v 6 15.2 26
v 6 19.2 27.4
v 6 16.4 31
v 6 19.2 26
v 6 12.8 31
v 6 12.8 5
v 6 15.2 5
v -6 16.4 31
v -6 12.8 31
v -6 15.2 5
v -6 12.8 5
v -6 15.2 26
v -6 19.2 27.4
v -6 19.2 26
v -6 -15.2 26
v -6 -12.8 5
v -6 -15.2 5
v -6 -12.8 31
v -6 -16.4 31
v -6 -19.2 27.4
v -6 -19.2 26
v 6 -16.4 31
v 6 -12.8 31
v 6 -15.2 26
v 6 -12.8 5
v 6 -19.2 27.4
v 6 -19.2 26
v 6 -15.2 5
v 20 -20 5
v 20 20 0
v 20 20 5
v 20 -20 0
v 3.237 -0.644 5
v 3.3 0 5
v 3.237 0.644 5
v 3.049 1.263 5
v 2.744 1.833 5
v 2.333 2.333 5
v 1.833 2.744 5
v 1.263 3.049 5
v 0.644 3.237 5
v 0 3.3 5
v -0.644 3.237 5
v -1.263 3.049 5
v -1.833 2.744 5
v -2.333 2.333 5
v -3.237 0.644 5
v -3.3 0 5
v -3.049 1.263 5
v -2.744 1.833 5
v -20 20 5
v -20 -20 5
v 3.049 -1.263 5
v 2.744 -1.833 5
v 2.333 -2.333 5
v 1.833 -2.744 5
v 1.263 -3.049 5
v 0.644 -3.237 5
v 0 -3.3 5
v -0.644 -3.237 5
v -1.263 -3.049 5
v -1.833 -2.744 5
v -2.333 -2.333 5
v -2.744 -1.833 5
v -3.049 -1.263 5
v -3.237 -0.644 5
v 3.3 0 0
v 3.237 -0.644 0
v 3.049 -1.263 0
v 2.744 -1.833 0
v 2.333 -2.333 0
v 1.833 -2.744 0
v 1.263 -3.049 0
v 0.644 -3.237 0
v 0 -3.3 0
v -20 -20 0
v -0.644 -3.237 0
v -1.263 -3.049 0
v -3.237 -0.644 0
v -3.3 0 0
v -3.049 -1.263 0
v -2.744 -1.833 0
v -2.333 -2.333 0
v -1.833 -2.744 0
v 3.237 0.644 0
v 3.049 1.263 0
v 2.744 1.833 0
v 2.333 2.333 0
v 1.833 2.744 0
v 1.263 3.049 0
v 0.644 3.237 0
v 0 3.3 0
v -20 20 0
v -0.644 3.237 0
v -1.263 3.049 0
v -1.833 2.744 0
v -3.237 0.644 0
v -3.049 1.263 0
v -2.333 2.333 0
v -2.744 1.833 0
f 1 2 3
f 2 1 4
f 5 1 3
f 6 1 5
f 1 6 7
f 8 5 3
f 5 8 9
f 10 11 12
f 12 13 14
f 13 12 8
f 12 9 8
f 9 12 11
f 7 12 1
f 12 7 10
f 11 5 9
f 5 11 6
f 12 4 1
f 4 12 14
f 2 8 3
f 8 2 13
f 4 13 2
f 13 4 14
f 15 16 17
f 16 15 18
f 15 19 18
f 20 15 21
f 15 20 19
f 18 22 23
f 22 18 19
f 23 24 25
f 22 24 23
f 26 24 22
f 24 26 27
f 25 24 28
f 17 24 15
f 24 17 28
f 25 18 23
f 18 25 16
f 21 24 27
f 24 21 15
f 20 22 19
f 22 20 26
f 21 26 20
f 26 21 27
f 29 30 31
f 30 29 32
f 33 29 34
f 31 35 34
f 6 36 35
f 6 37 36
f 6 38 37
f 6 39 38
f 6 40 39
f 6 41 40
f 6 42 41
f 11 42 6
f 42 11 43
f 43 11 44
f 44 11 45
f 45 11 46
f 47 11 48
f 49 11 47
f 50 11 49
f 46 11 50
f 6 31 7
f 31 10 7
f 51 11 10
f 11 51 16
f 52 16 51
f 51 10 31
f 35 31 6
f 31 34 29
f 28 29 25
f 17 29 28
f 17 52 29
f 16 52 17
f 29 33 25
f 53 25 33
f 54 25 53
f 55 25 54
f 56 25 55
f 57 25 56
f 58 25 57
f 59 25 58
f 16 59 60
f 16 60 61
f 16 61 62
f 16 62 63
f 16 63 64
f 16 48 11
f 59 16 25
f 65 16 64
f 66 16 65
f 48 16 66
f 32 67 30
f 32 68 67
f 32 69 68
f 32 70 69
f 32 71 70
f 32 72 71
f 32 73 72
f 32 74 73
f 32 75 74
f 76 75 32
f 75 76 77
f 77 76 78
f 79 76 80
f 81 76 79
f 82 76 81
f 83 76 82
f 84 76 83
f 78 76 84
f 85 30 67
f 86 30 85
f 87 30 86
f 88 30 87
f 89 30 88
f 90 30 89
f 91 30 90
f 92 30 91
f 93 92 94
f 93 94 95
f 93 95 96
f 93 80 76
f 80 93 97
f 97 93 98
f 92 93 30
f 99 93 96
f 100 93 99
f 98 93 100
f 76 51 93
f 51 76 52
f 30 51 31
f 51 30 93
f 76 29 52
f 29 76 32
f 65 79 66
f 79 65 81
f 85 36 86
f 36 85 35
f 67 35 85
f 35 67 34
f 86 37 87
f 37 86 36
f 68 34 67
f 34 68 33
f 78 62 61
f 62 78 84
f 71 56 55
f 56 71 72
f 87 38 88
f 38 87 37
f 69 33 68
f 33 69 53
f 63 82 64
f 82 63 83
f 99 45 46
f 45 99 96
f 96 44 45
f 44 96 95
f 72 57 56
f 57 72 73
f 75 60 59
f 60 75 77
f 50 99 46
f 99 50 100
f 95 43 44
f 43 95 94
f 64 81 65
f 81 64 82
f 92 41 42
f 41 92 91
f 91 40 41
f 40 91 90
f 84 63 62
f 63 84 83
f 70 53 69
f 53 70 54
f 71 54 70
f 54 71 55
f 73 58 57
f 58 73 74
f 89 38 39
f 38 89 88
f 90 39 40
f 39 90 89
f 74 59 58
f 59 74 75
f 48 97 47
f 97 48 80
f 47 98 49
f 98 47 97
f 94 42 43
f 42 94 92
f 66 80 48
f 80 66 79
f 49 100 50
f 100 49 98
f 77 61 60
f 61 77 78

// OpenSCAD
$fn = 32;

// ----------------------------------------------------------------------
// Snap-fit latch: 2 arms, 26 mm tall, 4.2 mm undercut hooks
// ----------------------------------------------------------------------

// --- parameters (mm) ---
base_d = 40;              // base plate depth
base_h = 5;               // base plate thickness
span = 28;                // distance between opposite arms
arm_t = 2.4;              // arm thickness
arm_d = 12;               // arm width
height = 26;              // free arm length
head_len = 4.2;           // hook reach
head_h = 5;               // hook height
lead = 1.4;               // lead-in ramp thickness
bore_d = 6.6;             // base fixing bore
top_z = 31;               // height of the arm tips above the base

arms = 2;

difference() {
  union() {
    /* base plate, centred on the arm ring */
    translate([-20, -20, 0]) cube([base_d, base_d, base_h]);
    for (a = [0 : 360 / arms : 359]) rotate([0, 0, a]) {
    /* arm, sunk 0.5 mm into the base */
    translate([-arm_d / 2, span / 2 - arm_t / 2, base_h - 0.5]) cube([arm_d, arm_t, height + 0.5]);
    /* hook: a convex hull of a tall inner block and a thin outer lip
       gives a flat undercut below and a lead-in ramp on top */
    hull() {
      translate([-arm_d / 2, span / 2 + arm_t / 2 - 0.6, top_z - head_h]) cube([arm_d, lead + 0.4, head_h]);
      translate([-arm_d / 2, span / 2 + arm_t / 2 - 0.2, top_z - head_h]) cube([arm_d, head_len, lead]);
    }
    }
  }
  translate([0, 0, -2.5]) cylinder(h = base_h + 5, d = bore_d);
}
